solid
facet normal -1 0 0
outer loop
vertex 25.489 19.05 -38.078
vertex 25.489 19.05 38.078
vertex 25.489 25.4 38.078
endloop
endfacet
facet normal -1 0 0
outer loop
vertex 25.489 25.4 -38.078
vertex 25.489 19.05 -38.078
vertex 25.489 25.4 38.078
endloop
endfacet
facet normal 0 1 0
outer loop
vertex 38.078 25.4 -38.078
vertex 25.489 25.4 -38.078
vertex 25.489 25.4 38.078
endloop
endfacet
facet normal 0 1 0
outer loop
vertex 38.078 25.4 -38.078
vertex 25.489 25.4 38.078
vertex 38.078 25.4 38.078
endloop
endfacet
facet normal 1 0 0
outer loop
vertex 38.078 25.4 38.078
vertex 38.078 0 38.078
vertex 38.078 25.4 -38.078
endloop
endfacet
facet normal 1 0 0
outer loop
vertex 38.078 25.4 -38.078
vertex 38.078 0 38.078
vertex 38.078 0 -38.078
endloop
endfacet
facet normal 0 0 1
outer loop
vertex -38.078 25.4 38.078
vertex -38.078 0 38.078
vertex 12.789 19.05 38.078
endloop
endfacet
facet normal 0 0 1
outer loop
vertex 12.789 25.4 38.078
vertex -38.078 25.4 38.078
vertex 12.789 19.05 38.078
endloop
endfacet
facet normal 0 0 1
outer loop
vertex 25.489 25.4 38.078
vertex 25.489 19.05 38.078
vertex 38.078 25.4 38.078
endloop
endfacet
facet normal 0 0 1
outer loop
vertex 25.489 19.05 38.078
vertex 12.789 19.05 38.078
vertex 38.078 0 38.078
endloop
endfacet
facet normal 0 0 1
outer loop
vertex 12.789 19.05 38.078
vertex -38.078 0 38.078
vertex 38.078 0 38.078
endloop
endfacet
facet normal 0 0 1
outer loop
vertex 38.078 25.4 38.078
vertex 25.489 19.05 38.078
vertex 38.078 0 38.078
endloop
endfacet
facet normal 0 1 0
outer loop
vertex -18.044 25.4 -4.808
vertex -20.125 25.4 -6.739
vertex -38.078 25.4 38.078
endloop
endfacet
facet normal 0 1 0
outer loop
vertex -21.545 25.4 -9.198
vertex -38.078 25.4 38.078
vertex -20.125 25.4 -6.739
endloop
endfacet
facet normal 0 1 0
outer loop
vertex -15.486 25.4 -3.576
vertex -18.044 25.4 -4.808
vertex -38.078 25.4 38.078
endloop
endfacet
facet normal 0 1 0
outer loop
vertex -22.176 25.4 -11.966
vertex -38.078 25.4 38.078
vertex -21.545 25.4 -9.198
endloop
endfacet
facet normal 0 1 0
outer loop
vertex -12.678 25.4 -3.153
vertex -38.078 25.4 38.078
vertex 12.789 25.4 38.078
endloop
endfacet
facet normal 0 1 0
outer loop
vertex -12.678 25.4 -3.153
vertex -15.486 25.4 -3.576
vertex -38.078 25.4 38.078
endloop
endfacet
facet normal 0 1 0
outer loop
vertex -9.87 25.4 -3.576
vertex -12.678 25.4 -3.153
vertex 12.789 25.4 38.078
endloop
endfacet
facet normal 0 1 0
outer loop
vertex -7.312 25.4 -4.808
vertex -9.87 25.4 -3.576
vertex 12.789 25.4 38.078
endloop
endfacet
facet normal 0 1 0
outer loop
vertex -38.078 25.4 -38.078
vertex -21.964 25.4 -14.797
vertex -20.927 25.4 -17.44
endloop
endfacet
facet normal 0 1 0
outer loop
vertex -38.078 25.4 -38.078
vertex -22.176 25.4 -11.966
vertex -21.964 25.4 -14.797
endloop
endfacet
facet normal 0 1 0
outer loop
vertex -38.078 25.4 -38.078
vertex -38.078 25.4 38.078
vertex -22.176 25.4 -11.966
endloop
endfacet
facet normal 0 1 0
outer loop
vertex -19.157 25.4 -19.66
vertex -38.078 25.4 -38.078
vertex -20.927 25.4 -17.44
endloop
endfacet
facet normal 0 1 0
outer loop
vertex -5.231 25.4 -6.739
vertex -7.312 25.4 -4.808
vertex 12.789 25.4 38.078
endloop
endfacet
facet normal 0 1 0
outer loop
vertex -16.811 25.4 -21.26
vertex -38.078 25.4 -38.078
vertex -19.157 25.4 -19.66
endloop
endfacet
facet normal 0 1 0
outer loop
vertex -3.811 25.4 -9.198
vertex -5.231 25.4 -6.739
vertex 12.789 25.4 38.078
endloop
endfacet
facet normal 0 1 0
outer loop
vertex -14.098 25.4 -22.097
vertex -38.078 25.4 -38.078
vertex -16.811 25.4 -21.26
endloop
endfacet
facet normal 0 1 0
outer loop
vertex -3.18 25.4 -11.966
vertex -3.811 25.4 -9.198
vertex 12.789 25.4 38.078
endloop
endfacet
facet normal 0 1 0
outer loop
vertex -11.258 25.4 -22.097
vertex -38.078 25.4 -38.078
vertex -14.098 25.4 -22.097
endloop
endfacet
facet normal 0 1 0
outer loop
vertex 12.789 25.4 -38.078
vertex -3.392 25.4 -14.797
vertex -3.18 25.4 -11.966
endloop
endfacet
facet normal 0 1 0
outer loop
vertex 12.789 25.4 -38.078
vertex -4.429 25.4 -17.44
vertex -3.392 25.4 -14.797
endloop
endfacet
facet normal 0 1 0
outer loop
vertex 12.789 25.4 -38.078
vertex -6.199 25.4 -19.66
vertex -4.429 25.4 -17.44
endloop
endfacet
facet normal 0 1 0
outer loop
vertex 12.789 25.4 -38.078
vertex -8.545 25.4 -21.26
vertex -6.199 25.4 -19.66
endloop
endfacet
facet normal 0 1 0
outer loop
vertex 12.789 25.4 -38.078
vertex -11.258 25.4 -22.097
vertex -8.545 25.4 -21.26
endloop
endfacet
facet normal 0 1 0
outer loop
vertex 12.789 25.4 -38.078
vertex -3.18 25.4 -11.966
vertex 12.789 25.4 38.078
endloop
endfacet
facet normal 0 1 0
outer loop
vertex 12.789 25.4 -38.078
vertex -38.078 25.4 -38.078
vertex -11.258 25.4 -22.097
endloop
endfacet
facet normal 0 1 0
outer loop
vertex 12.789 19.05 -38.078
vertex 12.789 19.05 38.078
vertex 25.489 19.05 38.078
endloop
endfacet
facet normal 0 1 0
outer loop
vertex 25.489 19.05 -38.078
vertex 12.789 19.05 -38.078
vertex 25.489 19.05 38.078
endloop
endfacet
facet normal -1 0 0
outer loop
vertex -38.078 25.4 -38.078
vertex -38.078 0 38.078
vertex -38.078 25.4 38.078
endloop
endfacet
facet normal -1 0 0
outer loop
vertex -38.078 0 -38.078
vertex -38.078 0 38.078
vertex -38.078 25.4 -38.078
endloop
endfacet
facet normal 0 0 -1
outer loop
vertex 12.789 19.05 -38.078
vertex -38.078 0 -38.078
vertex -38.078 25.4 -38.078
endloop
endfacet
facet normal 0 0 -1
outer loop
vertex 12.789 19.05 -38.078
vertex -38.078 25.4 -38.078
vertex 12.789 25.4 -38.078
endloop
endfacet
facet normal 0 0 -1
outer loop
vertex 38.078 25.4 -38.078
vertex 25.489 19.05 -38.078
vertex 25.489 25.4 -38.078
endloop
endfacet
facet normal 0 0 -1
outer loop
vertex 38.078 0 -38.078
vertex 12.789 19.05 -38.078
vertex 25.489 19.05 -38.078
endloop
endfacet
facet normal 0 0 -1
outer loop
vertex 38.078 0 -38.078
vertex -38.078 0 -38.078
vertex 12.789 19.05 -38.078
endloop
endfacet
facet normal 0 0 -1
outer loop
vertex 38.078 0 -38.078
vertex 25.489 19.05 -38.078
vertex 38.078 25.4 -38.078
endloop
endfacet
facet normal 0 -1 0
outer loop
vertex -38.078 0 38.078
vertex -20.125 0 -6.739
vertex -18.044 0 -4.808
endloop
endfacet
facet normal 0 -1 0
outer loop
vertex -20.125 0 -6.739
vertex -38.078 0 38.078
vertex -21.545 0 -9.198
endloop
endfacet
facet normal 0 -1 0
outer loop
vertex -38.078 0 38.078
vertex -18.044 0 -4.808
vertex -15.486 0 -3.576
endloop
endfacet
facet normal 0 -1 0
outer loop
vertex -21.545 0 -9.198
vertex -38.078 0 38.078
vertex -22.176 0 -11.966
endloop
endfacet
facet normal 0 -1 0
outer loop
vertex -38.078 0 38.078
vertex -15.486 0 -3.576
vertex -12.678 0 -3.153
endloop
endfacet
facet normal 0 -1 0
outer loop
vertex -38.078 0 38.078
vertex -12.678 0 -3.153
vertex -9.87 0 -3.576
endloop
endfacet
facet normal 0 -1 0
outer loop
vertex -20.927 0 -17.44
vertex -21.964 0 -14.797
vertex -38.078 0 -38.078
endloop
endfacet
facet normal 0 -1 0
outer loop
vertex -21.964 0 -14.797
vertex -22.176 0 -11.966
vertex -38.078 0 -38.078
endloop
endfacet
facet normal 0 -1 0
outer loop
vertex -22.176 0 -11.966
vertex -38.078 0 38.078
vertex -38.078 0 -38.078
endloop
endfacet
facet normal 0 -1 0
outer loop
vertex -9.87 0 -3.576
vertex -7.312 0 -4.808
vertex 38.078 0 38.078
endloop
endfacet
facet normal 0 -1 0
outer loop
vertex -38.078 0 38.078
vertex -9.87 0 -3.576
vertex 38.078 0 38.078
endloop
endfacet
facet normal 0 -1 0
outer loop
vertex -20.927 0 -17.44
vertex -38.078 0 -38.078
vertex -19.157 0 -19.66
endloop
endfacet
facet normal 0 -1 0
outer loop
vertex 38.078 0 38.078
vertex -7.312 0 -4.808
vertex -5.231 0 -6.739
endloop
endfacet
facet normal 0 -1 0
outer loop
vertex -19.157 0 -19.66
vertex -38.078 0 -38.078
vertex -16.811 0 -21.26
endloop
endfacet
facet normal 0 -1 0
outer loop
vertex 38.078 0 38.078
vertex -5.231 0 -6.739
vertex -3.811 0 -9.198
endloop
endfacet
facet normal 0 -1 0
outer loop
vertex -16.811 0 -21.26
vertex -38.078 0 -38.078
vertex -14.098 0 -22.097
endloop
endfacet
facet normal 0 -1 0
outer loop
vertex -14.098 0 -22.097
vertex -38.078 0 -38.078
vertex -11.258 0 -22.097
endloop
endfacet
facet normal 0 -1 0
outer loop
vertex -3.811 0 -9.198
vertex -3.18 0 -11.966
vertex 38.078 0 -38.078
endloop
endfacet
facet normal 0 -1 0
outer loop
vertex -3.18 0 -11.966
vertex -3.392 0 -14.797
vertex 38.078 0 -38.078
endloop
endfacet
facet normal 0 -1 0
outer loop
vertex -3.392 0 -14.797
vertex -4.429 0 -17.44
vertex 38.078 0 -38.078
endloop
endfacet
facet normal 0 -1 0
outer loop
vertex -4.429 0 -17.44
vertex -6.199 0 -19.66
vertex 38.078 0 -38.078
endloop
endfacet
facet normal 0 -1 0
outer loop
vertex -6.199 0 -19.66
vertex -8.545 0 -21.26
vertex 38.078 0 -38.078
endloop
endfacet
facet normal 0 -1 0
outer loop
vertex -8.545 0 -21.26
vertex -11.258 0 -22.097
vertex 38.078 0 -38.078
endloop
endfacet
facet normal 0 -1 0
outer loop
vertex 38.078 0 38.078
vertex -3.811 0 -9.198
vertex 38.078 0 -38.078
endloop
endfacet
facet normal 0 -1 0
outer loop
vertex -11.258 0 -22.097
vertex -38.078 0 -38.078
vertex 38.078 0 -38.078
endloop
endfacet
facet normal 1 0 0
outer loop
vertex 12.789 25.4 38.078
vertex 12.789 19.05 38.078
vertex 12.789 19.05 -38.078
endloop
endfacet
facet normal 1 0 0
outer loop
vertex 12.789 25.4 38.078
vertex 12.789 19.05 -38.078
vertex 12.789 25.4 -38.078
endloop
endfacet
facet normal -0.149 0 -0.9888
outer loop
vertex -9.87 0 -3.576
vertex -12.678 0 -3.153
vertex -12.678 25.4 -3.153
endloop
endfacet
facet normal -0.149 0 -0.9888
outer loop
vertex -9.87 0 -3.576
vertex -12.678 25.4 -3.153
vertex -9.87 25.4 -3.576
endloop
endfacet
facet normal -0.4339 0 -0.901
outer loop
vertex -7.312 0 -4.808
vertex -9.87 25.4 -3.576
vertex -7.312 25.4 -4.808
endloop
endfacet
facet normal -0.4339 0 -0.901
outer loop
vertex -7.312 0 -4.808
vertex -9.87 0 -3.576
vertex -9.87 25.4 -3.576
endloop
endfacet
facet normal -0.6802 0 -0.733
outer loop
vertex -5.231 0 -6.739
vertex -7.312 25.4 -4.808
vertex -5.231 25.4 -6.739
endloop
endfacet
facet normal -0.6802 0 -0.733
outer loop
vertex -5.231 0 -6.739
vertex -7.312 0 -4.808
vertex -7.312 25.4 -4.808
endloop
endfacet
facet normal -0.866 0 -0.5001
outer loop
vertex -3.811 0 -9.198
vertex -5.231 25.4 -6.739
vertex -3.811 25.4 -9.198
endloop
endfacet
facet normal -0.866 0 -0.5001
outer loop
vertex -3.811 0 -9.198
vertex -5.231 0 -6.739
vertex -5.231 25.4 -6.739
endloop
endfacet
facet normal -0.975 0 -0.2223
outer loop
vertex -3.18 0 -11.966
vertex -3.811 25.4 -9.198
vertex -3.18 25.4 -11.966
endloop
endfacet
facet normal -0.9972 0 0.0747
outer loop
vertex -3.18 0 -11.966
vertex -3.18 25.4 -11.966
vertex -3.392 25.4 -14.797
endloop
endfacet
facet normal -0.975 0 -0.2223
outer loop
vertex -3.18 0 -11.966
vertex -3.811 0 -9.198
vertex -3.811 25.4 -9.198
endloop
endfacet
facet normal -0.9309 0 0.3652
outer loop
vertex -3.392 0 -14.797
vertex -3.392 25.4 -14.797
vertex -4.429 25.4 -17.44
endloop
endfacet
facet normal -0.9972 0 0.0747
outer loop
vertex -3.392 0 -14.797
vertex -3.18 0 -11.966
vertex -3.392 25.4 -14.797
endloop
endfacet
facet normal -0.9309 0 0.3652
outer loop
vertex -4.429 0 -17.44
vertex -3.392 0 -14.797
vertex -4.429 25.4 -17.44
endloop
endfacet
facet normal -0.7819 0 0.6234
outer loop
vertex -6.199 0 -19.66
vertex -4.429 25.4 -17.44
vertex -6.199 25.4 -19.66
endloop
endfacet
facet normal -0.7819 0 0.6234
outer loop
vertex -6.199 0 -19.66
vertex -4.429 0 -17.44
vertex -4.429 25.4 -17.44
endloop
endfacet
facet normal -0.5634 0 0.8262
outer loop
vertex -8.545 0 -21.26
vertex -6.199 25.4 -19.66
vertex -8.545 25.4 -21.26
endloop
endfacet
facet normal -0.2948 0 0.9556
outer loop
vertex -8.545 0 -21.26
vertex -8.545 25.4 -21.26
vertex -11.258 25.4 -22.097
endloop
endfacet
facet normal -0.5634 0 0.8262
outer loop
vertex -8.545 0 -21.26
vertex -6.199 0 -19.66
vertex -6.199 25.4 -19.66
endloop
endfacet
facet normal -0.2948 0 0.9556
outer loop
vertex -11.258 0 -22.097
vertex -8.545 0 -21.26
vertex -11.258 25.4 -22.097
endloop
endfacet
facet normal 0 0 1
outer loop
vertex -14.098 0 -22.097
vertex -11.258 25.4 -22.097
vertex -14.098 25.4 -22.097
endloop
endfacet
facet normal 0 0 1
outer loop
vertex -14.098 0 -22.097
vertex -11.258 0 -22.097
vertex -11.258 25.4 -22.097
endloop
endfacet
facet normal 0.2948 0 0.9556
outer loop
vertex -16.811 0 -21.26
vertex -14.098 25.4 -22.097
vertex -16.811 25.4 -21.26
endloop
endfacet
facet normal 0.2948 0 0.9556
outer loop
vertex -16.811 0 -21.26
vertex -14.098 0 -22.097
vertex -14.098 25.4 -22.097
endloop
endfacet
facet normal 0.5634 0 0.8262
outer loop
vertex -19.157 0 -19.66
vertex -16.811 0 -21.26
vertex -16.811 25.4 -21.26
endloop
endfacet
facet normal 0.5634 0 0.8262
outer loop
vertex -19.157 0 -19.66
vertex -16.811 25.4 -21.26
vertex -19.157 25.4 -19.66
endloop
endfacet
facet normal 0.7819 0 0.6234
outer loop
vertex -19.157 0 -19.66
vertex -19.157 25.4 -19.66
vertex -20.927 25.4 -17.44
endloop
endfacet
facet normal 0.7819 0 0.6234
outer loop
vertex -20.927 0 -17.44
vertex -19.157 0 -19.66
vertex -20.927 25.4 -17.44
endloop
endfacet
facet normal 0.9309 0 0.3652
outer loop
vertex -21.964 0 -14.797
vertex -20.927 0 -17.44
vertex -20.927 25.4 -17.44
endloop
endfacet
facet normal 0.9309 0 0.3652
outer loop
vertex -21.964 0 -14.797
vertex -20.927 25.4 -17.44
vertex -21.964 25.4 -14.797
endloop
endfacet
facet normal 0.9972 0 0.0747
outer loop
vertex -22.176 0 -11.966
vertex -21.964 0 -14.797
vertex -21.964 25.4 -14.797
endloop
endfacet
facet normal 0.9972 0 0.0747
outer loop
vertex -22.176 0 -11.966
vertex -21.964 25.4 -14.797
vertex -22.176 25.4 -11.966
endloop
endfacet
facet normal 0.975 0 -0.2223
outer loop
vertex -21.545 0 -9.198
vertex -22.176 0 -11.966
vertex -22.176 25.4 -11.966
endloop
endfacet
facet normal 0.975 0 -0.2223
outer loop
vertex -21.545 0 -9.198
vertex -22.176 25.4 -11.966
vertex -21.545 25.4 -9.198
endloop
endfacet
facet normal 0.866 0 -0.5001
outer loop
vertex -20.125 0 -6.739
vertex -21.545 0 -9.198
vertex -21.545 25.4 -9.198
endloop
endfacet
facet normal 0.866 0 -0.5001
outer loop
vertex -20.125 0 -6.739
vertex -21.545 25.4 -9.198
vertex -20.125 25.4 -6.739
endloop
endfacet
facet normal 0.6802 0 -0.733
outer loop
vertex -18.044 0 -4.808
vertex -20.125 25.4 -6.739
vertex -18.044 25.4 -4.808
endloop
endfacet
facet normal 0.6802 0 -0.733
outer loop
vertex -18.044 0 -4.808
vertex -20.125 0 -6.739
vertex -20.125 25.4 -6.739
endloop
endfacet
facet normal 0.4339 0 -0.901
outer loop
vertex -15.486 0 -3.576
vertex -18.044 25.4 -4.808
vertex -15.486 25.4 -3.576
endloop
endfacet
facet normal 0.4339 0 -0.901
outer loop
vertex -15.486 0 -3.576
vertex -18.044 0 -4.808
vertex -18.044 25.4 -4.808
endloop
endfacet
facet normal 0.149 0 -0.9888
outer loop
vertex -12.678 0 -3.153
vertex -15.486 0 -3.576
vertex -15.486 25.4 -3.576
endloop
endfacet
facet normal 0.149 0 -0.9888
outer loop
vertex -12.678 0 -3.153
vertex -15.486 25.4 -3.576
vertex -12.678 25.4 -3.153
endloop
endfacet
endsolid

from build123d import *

# Parameters (mm, degrees)
SKETCH1_W           = 76.155927022
SKETCH1_H           = 76.155927022
SKETCH1_R           = 9.525
BOSS_EXTRUDE1_DEPTH = 25.4
SKETCH2_W           = 12.7
SKETCH2_H           = 6.35
CUT_EXTRUDE1_DEPTH  = 89.852780068


with BuildPart() as part:
    # Sketch1 → Boss-Extrude1 (new body)
    with BuildSketch(Plane(origin=(0, 0, 0), x_dir=(1, 0, 0), z_dir=(0, 1, 0))):
        Rectangle(SKETCH1_W, SKETCH1_H)
        with Locations(Location((-12.677963511, 12.677963511, 0), (0, 0, 270))):
            Circle(SKETCH1_R, mode=Mode.SUBTRACT)
    extrude(amount=BOSS_EXTRUDE1_DEPTH)

    # Sketch2 → Cut-Extrude1 (cut, through all)
    with BuildSketch(Plane.XY.offset(38.077963511)):
        with Locations((19.139376005, 22.225)):
            Rectangle(SKETCH2_W, SKETCH2_H)
    extrude(amount=-CUT_EXTRUDE1_DEPTH, mode=Mode.SUBTRACT)


solid = part.part
